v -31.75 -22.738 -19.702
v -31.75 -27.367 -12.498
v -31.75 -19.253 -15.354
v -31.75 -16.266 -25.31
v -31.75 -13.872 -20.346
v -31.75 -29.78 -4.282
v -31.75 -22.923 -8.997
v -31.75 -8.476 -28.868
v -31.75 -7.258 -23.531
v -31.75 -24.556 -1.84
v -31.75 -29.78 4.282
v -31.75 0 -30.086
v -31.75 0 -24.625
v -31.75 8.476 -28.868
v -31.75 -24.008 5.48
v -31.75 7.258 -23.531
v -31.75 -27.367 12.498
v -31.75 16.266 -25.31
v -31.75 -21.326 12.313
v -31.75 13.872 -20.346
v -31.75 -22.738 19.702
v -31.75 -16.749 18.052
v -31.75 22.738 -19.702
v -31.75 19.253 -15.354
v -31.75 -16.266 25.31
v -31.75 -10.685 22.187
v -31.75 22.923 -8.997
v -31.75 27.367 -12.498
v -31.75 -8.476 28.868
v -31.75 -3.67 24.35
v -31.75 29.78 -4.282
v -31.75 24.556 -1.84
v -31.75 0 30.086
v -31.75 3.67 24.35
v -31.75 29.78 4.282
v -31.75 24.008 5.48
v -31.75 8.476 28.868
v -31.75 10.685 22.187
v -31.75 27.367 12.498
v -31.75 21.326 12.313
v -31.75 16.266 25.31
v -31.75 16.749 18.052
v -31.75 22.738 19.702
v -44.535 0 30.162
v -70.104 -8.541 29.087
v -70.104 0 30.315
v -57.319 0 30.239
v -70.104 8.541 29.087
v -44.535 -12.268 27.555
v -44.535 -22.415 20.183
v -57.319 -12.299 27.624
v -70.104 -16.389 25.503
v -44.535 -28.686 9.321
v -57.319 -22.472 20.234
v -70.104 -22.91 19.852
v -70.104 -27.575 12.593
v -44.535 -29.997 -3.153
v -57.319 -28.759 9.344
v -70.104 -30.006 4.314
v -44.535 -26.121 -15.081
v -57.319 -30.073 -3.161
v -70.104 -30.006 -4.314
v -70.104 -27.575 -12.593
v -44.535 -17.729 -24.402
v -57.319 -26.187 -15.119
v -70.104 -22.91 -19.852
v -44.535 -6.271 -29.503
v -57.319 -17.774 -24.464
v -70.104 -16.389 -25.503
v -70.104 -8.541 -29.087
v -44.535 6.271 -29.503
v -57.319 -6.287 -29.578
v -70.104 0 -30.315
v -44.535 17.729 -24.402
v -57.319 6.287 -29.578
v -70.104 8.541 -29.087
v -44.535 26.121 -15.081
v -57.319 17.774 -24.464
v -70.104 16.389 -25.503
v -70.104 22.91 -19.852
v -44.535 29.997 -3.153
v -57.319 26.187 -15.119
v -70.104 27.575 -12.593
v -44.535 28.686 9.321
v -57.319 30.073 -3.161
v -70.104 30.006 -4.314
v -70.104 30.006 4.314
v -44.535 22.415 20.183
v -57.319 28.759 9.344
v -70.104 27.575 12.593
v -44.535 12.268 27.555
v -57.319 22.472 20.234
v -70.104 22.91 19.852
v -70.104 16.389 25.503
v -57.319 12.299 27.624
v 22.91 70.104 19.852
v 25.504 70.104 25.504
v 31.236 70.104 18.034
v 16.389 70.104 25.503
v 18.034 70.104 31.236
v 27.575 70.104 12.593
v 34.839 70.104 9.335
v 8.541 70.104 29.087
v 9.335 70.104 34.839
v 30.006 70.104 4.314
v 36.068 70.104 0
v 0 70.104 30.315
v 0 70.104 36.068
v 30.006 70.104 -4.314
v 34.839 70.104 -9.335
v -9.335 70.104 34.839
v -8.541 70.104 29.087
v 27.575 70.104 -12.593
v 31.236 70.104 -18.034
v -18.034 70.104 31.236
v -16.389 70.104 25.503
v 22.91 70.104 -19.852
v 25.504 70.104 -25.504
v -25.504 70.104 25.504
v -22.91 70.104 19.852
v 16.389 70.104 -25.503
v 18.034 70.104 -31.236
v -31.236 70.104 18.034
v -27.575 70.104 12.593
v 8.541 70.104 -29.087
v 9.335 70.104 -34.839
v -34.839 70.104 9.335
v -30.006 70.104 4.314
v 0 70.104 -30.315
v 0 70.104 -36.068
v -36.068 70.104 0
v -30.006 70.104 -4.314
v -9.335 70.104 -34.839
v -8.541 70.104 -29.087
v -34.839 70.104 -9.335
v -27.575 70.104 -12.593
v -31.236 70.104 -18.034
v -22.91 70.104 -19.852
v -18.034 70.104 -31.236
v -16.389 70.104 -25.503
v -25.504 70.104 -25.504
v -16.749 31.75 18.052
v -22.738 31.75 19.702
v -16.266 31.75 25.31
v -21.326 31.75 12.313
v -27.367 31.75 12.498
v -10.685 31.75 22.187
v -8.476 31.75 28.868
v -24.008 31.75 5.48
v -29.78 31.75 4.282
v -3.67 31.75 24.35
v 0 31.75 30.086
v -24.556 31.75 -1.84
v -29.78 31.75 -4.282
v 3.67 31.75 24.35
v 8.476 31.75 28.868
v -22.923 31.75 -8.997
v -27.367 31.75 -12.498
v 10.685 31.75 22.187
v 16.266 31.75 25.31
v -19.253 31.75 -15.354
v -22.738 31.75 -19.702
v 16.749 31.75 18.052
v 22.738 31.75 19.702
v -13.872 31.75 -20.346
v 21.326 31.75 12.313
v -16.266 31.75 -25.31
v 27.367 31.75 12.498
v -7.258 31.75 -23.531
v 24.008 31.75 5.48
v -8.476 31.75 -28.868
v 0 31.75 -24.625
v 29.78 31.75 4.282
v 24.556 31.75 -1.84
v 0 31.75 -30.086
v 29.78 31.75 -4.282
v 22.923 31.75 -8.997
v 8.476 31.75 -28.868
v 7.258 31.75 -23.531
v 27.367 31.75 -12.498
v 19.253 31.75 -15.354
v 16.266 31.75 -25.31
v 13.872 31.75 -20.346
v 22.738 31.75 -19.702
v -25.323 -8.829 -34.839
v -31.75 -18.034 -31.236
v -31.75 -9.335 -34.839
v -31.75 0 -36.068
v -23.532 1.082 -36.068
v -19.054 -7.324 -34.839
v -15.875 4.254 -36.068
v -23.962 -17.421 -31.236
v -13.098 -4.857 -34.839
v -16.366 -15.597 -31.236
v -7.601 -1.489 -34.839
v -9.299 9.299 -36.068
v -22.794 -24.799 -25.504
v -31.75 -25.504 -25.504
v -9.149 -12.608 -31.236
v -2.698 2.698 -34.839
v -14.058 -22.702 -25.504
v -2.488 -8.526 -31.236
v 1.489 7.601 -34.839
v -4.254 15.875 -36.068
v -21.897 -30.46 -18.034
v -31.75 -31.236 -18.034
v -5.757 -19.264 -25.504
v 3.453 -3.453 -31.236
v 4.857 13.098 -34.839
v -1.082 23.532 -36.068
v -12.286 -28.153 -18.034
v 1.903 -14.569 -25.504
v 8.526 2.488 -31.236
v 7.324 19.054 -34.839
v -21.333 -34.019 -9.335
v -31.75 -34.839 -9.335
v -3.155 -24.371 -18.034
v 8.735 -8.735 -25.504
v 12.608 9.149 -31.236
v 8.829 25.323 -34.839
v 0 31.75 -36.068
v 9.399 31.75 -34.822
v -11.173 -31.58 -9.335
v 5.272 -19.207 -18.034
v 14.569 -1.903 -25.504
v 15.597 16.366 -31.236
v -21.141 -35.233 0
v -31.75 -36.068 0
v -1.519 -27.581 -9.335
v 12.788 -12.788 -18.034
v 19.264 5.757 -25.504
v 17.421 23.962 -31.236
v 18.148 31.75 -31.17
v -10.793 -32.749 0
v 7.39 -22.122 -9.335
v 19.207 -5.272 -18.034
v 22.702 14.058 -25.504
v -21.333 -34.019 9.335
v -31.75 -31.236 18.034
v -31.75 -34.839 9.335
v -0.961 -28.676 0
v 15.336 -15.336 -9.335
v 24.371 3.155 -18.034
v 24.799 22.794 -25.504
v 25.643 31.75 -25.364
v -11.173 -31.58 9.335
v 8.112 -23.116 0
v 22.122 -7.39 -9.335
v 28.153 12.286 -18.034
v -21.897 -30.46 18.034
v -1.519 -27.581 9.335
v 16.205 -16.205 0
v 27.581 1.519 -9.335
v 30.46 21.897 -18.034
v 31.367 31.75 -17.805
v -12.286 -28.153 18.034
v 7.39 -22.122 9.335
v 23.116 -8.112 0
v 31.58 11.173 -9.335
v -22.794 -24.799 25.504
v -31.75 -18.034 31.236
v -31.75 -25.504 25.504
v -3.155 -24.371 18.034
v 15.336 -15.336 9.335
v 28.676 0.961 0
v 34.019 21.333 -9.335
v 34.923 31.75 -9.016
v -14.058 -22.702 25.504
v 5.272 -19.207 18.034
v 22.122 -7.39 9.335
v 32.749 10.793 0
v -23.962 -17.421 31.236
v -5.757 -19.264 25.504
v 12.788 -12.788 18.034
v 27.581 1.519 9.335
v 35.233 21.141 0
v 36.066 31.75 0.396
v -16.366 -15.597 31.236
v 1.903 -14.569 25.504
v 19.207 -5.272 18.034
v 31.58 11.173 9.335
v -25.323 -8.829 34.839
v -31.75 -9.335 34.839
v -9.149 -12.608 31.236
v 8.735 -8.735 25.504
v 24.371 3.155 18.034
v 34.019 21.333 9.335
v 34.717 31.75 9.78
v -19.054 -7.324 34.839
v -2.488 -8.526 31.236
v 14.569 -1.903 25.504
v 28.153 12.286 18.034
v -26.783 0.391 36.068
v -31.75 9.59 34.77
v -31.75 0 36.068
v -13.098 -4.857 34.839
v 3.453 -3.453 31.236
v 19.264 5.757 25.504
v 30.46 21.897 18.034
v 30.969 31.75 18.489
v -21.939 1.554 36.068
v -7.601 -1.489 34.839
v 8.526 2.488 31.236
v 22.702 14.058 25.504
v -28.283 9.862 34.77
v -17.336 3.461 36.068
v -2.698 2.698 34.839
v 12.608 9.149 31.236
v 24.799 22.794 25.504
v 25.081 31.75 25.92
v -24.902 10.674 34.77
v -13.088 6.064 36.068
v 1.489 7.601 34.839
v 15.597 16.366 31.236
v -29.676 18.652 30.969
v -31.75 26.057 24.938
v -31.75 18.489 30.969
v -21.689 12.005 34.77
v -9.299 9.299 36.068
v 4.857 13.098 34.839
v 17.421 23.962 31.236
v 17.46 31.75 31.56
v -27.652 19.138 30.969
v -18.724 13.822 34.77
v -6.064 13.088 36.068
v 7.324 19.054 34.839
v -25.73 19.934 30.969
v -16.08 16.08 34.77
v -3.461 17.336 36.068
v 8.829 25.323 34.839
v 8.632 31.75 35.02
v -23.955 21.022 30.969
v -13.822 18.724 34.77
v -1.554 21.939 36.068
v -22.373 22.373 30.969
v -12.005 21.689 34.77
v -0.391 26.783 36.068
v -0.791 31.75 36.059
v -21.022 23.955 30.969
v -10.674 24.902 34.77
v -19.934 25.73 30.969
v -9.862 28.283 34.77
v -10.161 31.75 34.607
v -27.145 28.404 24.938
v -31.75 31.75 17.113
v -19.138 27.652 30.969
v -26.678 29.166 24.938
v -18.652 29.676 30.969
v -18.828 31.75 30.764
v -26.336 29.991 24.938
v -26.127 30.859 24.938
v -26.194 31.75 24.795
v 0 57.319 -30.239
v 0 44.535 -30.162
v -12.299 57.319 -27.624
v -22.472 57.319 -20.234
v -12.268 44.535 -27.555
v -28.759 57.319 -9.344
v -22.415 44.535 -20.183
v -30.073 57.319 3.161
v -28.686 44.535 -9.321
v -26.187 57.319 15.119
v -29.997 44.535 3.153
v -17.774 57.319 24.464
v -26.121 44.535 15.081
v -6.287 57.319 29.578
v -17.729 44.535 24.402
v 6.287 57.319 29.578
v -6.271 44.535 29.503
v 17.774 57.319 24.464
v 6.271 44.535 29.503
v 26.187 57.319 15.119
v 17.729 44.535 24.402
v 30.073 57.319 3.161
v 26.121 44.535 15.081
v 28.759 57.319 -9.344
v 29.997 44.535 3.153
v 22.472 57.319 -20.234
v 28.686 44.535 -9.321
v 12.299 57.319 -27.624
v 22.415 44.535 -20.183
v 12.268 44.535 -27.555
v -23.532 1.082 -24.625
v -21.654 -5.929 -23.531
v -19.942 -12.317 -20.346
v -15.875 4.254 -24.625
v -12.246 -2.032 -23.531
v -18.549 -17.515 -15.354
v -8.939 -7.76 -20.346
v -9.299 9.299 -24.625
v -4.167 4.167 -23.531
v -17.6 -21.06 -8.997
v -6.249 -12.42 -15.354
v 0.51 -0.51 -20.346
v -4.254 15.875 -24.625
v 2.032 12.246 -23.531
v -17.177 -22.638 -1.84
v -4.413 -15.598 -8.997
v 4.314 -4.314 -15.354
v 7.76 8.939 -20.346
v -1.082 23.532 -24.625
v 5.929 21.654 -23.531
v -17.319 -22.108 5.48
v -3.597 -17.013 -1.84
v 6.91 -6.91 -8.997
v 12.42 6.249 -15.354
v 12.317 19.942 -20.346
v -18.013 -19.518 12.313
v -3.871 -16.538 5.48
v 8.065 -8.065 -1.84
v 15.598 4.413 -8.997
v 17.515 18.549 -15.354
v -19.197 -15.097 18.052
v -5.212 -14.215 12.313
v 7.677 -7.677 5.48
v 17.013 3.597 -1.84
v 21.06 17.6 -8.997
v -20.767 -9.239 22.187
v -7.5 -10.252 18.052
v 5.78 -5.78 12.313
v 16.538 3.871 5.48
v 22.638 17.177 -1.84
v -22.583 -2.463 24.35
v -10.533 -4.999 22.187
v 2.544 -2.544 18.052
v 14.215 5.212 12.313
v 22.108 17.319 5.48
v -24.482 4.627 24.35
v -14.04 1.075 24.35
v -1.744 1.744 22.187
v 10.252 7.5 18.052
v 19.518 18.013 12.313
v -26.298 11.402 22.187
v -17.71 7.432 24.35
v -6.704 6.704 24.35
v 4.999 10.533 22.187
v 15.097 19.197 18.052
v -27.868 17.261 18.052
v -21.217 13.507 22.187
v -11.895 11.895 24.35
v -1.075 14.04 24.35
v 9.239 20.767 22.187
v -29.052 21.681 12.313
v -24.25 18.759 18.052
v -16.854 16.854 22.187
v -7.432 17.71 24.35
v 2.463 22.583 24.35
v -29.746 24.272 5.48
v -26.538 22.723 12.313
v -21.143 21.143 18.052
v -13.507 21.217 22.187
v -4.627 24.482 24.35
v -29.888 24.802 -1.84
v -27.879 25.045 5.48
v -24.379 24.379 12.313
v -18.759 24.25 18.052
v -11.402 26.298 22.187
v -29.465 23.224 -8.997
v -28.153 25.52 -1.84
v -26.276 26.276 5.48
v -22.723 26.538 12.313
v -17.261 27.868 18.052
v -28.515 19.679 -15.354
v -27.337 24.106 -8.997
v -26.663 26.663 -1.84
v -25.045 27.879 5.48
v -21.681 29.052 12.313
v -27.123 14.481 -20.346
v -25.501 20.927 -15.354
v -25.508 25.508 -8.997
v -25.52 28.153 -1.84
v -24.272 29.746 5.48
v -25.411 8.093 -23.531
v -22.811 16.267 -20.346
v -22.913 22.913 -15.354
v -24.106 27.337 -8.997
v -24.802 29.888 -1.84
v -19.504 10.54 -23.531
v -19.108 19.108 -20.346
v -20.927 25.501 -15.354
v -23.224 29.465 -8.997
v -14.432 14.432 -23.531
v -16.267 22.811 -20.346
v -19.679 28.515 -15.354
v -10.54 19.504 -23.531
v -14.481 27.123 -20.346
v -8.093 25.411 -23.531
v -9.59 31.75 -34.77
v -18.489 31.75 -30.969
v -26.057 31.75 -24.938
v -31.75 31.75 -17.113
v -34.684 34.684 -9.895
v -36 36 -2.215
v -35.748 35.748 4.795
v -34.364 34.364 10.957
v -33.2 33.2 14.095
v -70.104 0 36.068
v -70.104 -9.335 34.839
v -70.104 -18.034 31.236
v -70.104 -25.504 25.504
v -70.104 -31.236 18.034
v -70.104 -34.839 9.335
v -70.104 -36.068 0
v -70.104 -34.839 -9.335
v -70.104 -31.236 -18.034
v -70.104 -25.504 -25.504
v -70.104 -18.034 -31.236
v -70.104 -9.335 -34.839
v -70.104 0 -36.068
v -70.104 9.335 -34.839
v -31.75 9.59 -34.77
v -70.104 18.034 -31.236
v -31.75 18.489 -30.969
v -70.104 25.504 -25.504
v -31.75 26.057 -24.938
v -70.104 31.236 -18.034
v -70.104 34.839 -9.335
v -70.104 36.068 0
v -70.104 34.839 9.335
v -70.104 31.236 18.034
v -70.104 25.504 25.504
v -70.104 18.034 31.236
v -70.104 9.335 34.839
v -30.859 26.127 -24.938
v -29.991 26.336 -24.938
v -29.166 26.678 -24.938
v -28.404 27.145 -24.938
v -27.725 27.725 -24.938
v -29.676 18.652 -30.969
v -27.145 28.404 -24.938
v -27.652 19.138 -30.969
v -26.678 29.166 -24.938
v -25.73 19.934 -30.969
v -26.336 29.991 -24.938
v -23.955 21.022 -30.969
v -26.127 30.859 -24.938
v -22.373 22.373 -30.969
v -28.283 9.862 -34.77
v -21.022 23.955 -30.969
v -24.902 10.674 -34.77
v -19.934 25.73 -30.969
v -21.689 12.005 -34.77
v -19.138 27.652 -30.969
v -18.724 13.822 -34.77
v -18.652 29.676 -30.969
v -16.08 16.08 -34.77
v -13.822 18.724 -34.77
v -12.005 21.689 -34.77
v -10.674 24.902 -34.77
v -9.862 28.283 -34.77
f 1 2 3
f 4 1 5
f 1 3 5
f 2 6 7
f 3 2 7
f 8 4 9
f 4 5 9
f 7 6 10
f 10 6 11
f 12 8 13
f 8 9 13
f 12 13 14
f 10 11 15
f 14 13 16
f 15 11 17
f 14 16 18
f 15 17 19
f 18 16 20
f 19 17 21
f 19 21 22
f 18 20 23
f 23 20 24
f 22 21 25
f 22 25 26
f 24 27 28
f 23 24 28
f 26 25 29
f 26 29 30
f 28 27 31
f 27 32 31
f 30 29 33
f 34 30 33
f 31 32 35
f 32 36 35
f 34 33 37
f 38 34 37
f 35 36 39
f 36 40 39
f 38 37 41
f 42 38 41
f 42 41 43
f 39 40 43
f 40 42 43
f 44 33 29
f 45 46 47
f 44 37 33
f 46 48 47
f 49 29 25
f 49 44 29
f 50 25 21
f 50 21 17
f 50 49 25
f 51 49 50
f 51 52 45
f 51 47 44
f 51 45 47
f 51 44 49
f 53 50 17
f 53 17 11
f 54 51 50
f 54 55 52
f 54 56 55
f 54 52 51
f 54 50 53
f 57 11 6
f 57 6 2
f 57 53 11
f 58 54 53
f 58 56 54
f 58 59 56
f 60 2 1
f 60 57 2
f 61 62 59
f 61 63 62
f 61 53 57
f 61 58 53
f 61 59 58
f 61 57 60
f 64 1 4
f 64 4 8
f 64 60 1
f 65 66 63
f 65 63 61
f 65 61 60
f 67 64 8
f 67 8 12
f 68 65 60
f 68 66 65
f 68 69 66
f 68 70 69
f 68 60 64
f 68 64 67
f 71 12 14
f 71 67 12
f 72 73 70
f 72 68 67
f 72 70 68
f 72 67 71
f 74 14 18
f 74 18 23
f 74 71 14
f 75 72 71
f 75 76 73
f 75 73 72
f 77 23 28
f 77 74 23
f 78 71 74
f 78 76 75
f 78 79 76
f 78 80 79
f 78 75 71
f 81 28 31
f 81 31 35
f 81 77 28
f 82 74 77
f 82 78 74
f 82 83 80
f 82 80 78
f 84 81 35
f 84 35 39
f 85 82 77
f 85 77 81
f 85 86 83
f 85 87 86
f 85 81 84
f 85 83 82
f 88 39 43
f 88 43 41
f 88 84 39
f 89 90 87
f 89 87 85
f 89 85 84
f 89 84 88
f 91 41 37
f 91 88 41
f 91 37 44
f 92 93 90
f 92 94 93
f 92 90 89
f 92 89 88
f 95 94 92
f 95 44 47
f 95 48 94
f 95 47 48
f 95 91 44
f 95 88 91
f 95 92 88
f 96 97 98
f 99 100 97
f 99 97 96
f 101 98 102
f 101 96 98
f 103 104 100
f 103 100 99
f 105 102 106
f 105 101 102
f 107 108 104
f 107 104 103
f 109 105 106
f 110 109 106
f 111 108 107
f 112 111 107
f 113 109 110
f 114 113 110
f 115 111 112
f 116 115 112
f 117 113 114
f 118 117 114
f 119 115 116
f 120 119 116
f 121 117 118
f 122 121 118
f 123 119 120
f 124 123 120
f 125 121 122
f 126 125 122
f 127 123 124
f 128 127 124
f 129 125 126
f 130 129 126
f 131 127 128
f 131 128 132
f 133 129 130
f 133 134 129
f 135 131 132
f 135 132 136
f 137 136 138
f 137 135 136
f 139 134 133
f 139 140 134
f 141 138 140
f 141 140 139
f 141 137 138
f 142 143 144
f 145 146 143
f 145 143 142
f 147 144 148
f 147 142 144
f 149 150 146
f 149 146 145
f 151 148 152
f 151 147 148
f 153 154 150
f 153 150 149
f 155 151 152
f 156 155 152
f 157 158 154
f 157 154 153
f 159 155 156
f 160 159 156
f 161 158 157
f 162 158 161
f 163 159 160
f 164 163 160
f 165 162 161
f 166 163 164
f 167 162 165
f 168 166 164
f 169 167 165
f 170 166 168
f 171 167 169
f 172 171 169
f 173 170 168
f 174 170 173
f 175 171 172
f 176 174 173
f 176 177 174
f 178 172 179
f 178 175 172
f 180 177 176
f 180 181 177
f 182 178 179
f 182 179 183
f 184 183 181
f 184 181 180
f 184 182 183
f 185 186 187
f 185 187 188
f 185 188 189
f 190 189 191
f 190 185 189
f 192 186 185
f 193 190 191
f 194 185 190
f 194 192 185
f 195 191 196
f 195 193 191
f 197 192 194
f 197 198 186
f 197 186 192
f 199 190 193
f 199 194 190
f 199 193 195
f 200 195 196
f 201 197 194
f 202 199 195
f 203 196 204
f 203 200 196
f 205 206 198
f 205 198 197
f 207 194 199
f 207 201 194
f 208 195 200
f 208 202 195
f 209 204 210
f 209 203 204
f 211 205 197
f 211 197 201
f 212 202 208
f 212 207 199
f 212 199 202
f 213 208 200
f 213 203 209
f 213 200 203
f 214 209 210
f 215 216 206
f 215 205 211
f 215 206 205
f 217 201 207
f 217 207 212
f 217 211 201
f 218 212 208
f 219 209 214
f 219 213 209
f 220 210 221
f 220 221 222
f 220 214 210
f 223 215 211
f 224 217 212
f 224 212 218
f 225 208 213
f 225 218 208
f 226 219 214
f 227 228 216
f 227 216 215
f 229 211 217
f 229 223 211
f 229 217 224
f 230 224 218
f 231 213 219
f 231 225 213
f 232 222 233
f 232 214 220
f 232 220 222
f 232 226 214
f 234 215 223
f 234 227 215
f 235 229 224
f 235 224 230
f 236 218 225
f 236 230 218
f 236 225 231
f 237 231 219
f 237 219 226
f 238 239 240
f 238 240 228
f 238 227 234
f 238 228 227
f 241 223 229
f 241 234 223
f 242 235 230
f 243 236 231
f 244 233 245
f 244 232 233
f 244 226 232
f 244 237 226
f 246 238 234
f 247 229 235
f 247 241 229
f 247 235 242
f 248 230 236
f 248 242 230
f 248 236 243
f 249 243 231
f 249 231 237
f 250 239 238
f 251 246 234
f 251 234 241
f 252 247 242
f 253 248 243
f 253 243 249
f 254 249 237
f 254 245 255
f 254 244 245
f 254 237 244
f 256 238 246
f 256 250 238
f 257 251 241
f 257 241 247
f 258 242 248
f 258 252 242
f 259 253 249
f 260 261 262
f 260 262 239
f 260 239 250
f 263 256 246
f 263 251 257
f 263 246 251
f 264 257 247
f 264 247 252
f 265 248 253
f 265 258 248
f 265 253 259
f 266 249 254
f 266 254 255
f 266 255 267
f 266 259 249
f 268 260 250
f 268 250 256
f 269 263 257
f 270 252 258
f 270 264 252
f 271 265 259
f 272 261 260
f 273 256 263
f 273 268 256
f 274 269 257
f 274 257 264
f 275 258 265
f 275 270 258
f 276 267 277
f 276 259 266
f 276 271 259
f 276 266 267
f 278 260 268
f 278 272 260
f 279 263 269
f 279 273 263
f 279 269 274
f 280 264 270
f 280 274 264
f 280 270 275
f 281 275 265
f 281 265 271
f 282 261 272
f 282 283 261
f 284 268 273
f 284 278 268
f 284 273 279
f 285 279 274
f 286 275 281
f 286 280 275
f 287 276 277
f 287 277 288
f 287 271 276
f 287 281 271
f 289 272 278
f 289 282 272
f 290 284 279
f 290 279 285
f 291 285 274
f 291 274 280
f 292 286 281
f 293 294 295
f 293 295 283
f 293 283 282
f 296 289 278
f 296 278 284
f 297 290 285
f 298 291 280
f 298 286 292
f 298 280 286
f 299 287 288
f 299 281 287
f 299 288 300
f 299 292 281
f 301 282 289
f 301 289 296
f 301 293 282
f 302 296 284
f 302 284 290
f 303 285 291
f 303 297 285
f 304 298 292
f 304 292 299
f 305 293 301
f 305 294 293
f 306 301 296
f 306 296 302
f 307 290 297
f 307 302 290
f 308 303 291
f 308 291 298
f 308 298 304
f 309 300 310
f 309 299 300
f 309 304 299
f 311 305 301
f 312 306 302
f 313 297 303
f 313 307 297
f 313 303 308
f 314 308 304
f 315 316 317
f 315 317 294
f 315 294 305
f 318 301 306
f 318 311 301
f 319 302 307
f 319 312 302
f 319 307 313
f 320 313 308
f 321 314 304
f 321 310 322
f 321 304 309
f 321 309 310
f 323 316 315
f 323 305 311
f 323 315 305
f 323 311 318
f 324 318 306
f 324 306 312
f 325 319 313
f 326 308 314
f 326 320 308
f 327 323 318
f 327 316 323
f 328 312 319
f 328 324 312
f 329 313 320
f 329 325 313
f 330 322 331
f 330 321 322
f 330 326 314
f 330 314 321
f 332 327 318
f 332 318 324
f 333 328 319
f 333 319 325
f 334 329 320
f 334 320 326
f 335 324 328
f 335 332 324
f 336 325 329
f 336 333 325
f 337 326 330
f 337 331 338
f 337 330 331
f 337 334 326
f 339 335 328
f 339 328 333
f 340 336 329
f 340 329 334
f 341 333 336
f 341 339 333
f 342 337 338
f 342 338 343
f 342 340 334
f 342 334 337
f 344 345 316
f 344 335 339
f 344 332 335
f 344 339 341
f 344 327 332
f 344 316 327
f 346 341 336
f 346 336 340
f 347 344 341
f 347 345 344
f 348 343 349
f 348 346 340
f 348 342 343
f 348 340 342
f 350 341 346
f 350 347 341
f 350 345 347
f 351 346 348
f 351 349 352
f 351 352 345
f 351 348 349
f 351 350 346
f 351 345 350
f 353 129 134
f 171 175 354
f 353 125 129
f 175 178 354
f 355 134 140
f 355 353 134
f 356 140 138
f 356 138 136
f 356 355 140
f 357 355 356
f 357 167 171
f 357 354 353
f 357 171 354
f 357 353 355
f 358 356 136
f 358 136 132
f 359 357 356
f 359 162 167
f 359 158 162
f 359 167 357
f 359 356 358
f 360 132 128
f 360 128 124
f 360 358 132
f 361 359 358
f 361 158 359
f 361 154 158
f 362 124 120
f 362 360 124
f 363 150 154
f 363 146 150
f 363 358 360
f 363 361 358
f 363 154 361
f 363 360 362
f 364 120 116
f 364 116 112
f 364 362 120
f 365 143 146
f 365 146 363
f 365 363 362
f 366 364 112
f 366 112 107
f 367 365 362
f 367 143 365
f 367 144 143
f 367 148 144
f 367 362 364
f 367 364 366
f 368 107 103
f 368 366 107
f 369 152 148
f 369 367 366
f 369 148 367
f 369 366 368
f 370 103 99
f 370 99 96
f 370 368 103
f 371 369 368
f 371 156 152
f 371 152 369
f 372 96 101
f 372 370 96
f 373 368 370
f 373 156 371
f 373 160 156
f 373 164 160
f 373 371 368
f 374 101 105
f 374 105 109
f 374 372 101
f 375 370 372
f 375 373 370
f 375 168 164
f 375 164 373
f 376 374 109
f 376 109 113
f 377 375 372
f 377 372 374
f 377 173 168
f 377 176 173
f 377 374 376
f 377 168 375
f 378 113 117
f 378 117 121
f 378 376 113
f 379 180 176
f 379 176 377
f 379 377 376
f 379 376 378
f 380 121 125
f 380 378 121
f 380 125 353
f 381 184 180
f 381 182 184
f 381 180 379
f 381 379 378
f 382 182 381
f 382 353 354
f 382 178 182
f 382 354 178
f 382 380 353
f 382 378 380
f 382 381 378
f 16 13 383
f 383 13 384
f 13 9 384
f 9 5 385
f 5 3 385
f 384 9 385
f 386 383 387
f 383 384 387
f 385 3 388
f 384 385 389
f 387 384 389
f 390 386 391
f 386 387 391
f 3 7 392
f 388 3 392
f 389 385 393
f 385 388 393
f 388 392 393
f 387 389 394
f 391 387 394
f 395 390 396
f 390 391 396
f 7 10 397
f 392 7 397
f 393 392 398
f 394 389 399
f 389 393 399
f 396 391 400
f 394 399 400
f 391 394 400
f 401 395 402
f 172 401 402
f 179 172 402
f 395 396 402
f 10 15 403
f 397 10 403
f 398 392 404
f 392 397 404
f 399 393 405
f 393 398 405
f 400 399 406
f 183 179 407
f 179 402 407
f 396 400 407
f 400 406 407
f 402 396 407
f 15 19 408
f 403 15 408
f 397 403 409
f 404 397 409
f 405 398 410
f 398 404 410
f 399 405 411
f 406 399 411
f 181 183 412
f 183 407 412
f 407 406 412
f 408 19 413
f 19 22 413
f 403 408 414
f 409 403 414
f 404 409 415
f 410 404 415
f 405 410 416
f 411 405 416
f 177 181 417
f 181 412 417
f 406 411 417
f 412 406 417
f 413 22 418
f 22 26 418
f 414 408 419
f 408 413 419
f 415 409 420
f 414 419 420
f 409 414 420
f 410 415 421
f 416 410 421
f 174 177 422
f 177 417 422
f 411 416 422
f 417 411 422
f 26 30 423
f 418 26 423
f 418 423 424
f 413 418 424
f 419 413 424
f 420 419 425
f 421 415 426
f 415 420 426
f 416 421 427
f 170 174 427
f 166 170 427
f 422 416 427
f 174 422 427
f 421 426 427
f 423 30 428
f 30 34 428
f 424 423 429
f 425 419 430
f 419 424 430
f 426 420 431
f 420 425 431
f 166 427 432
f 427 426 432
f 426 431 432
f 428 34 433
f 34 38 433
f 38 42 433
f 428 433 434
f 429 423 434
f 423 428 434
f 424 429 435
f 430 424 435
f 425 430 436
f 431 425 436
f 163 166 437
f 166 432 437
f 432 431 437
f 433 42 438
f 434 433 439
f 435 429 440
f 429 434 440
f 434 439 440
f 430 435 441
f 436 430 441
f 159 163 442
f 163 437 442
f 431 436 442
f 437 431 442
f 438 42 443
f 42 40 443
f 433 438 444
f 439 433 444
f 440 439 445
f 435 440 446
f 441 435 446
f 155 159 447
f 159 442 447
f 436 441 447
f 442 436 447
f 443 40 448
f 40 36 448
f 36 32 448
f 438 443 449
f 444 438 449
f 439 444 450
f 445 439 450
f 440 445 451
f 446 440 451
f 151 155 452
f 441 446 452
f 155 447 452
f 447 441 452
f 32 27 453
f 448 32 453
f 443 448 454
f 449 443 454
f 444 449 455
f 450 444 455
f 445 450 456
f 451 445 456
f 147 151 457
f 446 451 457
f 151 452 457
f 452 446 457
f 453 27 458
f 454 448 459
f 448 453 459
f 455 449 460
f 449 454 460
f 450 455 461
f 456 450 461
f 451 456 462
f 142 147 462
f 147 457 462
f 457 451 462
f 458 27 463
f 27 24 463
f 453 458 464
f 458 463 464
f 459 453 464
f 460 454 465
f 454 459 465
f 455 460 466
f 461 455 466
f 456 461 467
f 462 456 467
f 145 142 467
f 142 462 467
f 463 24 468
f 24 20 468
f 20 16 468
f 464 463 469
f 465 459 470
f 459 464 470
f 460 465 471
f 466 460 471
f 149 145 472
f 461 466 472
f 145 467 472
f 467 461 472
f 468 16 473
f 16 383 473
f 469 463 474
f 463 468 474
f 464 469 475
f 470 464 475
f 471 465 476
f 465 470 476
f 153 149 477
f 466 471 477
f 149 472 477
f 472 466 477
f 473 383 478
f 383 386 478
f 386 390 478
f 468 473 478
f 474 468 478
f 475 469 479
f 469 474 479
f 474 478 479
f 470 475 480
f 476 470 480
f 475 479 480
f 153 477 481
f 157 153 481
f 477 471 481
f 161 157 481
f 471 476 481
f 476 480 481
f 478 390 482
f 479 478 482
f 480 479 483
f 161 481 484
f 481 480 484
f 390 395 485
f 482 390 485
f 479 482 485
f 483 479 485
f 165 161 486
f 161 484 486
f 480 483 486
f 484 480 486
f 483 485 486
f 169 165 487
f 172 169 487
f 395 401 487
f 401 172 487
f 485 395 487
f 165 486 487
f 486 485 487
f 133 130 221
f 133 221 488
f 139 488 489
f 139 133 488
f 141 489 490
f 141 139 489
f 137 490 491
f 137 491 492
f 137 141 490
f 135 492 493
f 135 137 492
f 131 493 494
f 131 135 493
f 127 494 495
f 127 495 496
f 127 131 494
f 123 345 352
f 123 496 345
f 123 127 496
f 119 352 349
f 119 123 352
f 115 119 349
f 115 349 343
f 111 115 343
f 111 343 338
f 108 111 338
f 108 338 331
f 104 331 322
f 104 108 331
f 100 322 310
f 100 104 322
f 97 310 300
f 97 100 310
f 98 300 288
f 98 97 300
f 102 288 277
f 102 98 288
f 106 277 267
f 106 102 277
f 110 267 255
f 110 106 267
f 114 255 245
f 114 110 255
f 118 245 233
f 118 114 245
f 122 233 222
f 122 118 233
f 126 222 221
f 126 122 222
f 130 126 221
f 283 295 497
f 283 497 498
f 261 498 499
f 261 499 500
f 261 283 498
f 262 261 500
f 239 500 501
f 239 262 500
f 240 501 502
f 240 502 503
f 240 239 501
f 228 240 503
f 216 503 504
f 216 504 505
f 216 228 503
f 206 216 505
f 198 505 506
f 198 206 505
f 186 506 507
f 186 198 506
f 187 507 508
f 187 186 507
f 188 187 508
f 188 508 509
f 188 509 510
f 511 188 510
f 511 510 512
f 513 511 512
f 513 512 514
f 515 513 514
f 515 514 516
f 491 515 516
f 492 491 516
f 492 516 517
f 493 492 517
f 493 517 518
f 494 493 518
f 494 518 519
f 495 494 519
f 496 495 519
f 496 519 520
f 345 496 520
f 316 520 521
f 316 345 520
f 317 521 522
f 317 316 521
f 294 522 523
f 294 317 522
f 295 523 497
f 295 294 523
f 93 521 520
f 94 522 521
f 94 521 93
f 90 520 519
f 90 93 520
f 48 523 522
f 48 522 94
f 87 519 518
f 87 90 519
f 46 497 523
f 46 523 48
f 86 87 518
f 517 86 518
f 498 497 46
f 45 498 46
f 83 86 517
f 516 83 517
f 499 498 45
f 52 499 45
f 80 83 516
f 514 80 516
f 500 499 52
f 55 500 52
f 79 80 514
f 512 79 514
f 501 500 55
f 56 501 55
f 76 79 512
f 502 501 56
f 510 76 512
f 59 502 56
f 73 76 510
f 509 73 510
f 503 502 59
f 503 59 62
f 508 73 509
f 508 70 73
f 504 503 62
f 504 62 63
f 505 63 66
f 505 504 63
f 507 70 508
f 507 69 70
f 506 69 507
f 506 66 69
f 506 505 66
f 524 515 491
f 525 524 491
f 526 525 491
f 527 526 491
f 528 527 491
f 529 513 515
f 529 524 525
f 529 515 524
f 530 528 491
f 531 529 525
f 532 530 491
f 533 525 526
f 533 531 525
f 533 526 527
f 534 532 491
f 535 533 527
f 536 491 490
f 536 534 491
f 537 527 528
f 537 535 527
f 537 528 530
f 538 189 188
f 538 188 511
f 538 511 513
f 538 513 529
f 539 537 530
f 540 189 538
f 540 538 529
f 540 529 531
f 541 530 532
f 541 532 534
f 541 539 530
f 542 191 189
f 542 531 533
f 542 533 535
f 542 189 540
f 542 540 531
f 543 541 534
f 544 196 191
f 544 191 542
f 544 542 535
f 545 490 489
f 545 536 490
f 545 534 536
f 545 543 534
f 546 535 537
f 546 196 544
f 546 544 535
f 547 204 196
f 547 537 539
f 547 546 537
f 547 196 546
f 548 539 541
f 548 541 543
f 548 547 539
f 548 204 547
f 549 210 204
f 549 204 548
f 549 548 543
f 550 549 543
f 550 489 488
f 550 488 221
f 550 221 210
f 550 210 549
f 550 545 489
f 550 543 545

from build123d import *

# Parameters (mm, degrees)
SKETCH3_R   = 36.068
SKETCH3_R_2 = 24.6253


with BuildPart() as part:
    # Sketch1 → Revolve1 (revolve)
    with BuildSketch(Plane.XY):
        Polygon((-70.104, -36.068), (-31.75, -36.068), (-31.75, -30.0863), (-70.104, -30.3149), align=None)
    revolve(axis=Axis((-70.104, 0, 0), (1, 0, 0)))


with BuildPart() as body_2:
    # Sketch2 → Revolve2 (revolve)
    with BuildSketch(Plane.XY):
        Polygon((30.3149, 70.104), (30.0863, 31.75), (36.068, 31.75), (36.068, 70.104), align=None)
    revolve(axis=Axis((0, 0, 0), (0, 1, 0)))


with BuildPart() as sweep1_tool:
    # Sweep1: sweep along a path in Sketch4
    with BuildLine(Plane.XY) as sweep1_path:
        ThreePointArc((-31.75, 0), (-9.29936, 9.29936), (0, 31.75))
    # Sketch3 → Sweep1 (sweep)
    with BuildSketch(Plane(origin=(-31.75, 0, 0), x_dir=(0, 0, -1), z_dir=(1, 0, 0))):
        Circle(SKETCH3_R)
        Circle(SKETCH3_R_2, mode=Mode.SUBTRACT)
    sweep(path=sweep1_path.line)


with BuildPart() as part_1:
    add(part.part)


with BuildPart() as part_2:
    # Sweep1: joined with sweep1_tool
    add(part_1.part.fuse(sweep1_tool.part, body_2.part, tol=0.00001))


solid = part_2.part
